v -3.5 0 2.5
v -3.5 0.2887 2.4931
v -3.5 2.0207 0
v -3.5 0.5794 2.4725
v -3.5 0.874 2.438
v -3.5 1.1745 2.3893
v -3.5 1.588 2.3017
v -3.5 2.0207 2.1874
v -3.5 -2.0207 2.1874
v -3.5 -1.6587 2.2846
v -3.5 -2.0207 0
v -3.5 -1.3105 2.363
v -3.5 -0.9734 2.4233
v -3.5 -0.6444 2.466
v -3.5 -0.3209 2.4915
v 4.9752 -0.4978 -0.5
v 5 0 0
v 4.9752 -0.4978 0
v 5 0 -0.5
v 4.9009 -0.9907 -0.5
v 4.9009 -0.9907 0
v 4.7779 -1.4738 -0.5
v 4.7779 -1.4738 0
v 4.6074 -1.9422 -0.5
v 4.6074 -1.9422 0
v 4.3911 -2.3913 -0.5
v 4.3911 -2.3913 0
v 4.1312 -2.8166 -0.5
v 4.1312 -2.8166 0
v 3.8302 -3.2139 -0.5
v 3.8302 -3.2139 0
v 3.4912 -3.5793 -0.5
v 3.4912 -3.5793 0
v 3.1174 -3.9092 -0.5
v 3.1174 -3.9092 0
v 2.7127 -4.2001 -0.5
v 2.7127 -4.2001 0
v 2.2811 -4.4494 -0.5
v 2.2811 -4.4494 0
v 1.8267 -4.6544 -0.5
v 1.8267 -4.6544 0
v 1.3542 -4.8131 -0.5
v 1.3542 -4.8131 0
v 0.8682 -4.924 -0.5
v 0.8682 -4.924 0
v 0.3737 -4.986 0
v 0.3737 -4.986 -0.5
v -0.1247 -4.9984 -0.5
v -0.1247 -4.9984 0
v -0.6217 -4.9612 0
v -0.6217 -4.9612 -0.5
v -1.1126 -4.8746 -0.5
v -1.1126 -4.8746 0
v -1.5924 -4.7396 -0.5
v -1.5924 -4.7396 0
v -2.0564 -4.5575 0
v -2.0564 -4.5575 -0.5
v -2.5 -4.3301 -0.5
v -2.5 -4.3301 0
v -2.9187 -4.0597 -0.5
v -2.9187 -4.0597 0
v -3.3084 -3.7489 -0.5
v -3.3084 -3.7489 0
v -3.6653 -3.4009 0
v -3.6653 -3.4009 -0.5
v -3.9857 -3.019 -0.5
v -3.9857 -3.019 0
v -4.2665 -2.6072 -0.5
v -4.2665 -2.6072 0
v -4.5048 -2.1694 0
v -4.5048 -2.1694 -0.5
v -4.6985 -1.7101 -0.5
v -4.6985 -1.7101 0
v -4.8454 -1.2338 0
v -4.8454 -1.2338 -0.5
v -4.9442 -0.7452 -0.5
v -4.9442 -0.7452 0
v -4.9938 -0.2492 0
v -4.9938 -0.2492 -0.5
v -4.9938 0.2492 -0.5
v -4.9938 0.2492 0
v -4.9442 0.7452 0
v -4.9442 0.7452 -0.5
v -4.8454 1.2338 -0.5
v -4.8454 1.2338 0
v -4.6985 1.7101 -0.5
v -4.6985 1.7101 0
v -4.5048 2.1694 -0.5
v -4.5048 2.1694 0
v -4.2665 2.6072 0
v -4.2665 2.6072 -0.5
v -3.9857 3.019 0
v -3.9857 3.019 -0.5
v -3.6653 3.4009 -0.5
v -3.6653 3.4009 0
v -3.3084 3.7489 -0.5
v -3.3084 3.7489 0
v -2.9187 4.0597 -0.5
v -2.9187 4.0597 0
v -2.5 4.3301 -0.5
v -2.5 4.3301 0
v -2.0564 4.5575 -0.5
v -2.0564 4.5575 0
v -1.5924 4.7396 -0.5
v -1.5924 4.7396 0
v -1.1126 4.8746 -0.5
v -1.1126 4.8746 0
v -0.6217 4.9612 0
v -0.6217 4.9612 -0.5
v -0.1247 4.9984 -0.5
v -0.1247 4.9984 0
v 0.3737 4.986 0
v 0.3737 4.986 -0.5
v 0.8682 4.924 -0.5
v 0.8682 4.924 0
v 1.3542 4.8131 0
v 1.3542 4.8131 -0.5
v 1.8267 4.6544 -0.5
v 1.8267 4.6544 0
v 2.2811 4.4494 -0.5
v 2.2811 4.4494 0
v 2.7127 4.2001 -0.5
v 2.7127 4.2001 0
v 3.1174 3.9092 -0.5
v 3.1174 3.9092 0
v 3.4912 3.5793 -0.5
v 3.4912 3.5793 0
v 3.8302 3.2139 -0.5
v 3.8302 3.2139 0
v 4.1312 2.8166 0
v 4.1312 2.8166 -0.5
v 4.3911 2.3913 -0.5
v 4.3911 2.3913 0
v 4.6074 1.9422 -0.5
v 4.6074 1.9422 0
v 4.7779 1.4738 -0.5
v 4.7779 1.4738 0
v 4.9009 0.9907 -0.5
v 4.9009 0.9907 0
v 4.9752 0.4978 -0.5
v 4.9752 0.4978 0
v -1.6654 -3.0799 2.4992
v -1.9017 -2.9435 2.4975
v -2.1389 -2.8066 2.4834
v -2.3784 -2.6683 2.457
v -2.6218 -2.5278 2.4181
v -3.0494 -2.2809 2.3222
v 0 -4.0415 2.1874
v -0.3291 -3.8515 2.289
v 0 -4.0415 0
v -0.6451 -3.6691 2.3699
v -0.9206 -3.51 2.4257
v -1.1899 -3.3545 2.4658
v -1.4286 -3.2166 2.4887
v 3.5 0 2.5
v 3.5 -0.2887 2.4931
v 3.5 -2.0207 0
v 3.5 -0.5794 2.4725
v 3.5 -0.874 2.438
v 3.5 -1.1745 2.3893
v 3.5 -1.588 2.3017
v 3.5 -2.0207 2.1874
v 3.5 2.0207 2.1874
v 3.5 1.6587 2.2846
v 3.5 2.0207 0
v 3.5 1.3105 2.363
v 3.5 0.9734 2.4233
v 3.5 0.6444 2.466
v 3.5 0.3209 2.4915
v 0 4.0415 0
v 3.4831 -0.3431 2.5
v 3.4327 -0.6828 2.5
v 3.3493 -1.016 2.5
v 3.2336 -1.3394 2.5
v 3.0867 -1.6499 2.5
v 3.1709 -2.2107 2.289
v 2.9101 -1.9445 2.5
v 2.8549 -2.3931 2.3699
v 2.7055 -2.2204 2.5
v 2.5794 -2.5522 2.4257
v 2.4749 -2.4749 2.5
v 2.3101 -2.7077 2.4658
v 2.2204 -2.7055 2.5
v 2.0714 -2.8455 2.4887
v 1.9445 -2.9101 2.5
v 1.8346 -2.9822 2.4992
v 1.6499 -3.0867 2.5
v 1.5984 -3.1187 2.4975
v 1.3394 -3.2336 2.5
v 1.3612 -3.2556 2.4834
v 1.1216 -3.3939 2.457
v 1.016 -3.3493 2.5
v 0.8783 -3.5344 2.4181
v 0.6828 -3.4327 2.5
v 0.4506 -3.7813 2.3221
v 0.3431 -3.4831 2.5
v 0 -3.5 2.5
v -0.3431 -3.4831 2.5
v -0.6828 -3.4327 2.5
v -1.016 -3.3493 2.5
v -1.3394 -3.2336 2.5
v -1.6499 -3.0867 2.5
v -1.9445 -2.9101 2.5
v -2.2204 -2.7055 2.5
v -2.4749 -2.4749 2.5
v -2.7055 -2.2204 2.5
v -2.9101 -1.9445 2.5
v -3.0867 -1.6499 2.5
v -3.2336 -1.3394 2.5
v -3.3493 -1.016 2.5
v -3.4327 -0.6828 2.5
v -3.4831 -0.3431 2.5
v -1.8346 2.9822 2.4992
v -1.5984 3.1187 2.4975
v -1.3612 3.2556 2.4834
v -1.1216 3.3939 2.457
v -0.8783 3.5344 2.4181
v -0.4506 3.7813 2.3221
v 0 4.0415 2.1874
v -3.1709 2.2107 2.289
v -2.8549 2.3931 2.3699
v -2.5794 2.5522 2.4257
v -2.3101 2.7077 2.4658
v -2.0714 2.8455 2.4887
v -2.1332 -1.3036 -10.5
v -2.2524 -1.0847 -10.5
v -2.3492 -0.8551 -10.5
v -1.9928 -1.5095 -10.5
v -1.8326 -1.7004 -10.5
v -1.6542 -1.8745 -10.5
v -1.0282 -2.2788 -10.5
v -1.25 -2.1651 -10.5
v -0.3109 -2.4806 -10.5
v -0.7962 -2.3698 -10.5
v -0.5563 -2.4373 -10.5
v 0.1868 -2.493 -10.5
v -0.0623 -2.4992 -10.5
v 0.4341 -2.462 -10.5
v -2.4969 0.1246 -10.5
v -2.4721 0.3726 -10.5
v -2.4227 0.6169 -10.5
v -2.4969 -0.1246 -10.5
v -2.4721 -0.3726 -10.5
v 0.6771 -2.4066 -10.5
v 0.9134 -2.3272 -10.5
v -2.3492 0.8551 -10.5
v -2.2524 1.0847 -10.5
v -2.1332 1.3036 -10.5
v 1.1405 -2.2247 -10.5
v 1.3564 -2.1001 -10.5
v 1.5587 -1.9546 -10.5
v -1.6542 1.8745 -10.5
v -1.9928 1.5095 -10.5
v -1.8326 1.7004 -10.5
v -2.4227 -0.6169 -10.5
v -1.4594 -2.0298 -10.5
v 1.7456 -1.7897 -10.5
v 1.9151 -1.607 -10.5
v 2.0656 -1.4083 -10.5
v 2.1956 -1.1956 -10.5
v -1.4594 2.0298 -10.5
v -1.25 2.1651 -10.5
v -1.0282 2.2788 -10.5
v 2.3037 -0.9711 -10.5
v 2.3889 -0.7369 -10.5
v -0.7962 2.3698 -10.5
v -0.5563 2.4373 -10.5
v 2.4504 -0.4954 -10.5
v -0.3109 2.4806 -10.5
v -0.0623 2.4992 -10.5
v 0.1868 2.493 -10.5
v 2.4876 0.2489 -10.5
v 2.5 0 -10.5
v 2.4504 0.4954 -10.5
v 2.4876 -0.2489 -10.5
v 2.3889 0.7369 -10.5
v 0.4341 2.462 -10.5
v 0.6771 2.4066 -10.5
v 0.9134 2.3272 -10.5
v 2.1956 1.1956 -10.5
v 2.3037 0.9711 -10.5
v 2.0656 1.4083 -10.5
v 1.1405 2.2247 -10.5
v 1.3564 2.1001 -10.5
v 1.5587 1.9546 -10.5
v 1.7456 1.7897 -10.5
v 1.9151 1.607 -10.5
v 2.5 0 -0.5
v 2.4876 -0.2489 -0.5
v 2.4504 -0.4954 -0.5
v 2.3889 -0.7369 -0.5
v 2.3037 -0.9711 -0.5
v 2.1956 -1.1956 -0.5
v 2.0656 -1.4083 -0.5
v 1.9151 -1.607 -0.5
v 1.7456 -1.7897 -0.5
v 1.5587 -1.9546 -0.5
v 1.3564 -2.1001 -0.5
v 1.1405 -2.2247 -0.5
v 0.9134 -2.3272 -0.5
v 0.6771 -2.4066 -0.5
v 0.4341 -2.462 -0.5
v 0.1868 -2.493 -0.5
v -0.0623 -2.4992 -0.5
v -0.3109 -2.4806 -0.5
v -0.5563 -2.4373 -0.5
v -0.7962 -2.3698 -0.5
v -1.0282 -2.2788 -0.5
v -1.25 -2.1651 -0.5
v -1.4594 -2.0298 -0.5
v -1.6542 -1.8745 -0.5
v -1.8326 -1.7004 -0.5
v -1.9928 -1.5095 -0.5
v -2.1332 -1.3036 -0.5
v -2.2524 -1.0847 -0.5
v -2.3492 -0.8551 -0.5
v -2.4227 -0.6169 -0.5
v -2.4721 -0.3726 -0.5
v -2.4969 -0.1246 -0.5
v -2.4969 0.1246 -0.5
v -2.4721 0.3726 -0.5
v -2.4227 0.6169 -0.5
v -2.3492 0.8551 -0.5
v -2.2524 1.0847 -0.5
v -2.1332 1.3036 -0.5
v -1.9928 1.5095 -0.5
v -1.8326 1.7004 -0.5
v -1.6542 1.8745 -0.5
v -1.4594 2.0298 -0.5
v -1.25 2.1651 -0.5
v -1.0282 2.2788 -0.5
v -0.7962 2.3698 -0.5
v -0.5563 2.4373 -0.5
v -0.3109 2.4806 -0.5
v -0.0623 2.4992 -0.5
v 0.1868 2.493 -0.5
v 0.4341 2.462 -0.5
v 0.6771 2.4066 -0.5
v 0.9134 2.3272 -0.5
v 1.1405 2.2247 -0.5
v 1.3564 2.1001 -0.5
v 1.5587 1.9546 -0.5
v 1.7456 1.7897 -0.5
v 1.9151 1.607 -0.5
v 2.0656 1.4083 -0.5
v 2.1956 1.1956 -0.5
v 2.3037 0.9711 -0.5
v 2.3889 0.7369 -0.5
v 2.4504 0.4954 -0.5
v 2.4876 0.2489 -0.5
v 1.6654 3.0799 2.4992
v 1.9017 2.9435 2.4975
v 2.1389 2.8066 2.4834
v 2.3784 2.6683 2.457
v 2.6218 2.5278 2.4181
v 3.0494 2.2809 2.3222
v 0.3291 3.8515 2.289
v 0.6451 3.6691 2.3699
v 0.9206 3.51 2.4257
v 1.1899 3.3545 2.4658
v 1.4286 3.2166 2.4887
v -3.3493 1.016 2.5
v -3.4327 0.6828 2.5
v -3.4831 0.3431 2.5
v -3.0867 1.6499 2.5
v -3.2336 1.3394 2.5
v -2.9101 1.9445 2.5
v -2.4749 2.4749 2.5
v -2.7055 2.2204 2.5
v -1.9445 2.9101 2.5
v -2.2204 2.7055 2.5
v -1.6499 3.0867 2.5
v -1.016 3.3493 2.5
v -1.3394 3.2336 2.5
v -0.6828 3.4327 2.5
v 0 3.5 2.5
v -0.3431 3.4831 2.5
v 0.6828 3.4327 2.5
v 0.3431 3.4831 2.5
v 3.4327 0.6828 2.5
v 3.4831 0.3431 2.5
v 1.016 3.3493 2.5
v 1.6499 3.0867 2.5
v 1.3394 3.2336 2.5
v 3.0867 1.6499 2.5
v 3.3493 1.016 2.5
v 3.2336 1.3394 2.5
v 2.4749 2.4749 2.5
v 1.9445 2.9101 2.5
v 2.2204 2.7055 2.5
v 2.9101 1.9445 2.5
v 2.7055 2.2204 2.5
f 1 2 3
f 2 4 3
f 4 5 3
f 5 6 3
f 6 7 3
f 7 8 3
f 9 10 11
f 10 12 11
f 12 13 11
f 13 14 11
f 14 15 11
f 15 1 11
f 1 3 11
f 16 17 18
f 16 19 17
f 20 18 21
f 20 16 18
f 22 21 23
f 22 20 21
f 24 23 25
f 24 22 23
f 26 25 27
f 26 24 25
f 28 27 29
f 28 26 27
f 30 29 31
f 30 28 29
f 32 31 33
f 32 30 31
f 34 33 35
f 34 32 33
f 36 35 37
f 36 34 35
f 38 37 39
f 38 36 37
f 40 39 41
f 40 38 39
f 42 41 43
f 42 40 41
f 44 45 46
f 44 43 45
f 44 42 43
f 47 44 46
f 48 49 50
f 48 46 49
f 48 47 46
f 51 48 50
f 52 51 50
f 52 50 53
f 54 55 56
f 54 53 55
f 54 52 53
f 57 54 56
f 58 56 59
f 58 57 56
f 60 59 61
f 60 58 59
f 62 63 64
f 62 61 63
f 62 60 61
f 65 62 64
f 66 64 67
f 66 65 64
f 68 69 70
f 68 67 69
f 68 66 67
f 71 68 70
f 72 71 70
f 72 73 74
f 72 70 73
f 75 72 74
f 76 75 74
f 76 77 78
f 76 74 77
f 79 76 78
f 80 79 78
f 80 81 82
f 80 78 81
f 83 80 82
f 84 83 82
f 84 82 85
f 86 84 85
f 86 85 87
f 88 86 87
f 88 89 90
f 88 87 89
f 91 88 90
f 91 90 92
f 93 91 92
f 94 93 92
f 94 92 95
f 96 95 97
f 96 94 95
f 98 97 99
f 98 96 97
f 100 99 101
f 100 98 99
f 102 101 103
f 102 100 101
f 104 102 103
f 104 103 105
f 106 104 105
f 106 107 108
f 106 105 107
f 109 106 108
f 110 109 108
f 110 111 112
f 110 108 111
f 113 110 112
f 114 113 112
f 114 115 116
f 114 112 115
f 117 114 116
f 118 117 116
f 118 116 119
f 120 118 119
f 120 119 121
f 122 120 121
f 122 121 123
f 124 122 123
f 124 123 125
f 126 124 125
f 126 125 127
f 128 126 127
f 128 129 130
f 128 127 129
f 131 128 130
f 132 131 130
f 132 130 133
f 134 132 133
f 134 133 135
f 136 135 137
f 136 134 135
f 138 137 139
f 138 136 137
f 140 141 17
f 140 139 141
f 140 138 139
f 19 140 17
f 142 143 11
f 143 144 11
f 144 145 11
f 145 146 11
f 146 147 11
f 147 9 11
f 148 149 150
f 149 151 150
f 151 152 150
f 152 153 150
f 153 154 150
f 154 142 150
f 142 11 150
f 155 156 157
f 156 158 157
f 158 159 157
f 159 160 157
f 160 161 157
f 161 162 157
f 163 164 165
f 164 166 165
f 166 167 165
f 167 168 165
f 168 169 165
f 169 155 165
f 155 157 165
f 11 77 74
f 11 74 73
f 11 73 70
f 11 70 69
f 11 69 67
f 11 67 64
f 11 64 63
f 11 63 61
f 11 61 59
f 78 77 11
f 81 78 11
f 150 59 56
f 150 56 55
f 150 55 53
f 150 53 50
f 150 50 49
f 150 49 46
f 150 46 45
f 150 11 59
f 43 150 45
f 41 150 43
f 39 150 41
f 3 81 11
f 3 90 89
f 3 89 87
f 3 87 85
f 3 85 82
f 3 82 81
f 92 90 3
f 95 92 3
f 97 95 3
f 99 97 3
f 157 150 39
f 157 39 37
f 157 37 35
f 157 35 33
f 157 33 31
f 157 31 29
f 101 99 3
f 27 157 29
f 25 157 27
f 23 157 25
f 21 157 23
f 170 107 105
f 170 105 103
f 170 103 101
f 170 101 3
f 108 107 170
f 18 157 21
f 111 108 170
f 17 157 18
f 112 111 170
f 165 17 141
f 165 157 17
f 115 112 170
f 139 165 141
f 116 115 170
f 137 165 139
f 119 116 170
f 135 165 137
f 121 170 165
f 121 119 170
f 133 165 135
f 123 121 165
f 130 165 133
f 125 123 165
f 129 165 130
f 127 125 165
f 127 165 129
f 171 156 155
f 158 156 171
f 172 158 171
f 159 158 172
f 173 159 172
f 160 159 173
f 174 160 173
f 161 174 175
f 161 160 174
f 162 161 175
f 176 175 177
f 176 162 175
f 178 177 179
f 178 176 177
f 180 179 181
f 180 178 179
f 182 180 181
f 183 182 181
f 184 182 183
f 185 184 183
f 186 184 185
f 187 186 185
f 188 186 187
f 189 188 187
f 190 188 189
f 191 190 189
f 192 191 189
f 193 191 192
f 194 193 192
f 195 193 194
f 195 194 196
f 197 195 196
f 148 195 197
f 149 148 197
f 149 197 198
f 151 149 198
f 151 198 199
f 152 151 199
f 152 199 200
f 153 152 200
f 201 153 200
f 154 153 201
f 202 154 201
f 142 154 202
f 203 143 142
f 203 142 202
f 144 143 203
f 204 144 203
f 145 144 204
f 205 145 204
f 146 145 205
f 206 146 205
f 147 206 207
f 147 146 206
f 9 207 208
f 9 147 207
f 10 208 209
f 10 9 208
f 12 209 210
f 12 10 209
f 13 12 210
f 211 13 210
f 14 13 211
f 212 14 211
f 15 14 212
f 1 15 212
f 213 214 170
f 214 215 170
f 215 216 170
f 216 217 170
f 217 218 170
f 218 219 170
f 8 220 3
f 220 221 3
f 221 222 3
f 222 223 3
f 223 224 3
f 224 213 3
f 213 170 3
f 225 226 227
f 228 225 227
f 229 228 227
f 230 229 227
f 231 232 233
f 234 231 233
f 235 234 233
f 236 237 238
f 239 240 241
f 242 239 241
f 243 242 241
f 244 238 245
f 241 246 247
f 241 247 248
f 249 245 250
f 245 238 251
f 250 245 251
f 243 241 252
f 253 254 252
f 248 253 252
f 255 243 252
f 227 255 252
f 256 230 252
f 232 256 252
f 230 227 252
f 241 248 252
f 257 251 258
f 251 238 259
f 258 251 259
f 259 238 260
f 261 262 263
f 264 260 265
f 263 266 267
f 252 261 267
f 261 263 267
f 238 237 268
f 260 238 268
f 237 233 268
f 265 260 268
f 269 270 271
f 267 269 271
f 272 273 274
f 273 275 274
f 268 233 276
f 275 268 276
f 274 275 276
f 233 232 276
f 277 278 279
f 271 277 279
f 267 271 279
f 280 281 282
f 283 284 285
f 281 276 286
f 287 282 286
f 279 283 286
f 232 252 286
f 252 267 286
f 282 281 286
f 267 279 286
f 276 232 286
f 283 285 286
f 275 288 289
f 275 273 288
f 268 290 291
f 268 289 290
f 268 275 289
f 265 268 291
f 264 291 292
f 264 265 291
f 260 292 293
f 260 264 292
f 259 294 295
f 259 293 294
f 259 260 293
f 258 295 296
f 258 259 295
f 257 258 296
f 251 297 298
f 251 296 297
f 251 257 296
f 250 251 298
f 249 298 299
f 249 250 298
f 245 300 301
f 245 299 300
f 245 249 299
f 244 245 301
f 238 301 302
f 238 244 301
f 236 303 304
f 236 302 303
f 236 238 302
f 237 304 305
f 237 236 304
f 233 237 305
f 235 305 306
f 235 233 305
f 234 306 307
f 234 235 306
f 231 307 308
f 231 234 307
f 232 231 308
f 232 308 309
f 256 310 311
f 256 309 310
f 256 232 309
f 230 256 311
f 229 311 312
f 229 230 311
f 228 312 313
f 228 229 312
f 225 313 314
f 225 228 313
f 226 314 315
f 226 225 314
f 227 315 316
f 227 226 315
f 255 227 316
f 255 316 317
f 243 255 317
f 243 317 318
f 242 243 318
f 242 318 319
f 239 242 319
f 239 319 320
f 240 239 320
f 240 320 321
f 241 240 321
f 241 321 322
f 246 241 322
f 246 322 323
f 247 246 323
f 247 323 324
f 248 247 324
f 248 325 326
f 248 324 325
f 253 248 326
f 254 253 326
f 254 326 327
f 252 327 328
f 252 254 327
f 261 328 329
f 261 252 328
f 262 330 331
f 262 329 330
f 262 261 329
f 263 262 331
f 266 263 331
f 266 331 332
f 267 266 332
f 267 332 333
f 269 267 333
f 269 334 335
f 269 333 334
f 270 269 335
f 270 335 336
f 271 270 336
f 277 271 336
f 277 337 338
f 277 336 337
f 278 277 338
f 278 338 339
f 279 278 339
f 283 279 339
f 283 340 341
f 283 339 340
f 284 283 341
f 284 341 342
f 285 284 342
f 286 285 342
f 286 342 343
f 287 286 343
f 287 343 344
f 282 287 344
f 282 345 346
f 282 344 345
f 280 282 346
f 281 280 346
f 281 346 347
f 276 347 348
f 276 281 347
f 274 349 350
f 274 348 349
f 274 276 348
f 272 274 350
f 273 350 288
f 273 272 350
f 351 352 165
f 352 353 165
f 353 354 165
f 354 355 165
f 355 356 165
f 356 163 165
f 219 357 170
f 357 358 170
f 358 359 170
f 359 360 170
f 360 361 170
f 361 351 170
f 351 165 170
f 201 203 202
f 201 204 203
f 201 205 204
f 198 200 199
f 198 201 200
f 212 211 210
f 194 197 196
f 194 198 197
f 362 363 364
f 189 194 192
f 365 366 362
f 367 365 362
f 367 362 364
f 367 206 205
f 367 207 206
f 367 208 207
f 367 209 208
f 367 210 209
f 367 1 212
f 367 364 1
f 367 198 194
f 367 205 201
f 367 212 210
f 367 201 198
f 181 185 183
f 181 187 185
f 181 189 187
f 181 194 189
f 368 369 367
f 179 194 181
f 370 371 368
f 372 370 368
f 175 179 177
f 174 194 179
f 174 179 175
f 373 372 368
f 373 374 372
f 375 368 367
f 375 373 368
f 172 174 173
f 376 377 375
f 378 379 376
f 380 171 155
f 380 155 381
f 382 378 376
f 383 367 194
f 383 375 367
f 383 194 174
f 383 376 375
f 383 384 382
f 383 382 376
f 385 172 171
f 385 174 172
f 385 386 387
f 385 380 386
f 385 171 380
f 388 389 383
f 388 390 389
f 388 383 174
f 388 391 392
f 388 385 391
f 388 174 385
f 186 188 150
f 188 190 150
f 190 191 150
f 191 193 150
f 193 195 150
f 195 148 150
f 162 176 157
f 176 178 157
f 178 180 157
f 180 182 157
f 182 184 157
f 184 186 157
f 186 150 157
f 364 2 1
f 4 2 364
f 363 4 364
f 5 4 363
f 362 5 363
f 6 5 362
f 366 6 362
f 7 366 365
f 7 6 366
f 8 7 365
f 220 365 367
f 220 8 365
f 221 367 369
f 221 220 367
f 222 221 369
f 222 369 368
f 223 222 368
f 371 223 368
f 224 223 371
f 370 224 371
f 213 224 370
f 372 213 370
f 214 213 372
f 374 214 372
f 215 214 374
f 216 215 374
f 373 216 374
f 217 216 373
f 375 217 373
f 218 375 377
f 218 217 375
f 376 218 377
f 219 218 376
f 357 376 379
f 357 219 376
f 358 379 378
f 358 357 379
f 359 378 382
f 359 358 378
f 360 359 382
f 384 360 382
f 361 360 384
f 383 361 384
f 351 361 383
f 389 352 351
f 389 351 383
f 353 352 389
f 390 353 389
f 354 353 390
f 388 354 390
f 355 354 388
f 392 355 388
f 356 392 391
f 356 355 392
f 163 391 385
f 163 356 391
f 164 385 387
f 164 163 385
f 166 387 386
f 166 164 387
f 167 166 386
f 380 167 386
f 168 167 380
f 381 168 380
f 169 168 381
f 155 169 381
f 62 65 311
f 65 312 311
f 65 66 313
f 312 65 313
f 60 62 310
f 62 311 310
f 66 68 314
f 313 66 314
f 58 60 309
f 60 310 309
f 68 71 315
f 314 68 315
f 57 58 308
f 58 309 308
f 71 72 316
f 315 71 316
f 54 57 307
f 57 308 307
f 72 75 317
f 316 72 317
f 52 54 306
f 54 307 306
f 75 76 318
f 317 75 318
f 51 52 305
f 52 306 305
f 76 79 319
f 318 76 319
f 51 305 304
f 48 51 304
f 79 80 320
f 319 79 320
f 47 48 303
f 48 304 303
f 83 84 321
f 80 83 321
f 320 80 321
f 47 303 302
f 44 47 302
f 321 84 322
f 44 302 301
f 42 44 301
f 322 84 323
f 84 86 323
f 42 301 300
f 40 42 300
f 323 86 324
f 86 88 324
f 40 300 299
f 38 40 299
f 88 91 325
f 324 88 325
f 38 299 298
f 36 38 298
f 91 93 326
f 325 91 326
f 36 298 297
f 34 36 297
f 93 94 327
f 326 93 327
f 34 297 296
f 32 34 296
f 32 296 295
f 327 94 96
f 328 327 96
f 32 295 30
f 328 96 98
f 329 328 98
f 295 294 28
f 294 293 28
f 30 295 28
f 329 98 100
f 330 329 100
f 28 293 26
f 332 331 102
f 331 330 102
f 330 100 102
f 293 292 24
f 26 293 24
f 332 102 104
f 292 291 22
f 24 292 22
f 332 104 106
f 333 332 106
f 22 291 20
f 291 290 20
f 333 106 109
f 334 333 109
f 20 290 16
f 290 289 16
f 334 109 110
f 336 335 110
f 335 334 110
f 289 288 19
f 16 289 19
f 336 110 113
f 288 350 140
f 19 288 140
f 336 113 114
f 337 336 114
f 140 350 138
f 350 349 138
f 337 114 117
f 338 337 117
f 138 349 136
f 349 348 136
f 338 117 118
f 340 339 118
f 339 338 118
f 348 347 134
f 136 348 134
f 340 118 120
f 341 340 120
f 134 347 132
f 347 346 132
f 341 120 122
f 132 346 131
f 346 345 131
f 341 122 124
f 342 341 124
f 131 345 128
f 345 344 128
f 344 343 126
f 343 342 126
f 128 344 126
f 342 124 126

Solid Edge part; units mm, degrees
sketch "Sketch1" plane through (0, 0, 0) normal (0, -1, 0) x (1, 0, 0)
  line L0 (2.5, -0.5) -> (2.5, -10.5)
  line L1 (2.5, -10.5) -> (0, -10.5)
  line L2 (0, -10.5) -> (0, 0)
  line L3 (0, 0) -> (5, 0)
  line L4 (5, 0) -> (5, -0.5)
  line L5 (5, -0.5) -> (2.5, -0.5)
revolve "RevolvedProtrusion1" add sketch "Sketch1" angle 360 about axis through (0, 0, -10.5) along (0, 0, 1)
sketch "Sketch2" plane through (0, 0, 0) normal (0, 0, 1) x (-1, 0, 0)
  line L0 (3.5, -2.0207) -> (3.5, 2.0207)
  line L1 (3.5, 2.0207) -> (0, 4.0415)
  line L2 (0, 4.0415) -> (-3.5, 2.0207)
  line L3 (-3.5, 2.0207) -> (-3.5, -2.0207)
  line L4 (-3.5, -2.0207) -> (0, -4.0415)
  line L5 (0, -4.0415) -> (3.5, -2.0207)
extrude "Protrusion1" add sketch "Sketch2" along normal blind 2.5
sketch "Sketch3" plane through (0, 0, 0) normal (0, -1, 0) x (1, 0, 0)
  line L0 (6.0981, 2.5) -> (3.5, 2.5)
  line L1 (3.5, 2.5) -> (6.0981, 1)
  line L2 (6.0981, 1) -> (6.0981, 2.5)
revolve "RevolvedCutout1" cut sketch "Sketch3" angle 360 about axis through (0, 0, 3.8117) along (0, 0, -1)
